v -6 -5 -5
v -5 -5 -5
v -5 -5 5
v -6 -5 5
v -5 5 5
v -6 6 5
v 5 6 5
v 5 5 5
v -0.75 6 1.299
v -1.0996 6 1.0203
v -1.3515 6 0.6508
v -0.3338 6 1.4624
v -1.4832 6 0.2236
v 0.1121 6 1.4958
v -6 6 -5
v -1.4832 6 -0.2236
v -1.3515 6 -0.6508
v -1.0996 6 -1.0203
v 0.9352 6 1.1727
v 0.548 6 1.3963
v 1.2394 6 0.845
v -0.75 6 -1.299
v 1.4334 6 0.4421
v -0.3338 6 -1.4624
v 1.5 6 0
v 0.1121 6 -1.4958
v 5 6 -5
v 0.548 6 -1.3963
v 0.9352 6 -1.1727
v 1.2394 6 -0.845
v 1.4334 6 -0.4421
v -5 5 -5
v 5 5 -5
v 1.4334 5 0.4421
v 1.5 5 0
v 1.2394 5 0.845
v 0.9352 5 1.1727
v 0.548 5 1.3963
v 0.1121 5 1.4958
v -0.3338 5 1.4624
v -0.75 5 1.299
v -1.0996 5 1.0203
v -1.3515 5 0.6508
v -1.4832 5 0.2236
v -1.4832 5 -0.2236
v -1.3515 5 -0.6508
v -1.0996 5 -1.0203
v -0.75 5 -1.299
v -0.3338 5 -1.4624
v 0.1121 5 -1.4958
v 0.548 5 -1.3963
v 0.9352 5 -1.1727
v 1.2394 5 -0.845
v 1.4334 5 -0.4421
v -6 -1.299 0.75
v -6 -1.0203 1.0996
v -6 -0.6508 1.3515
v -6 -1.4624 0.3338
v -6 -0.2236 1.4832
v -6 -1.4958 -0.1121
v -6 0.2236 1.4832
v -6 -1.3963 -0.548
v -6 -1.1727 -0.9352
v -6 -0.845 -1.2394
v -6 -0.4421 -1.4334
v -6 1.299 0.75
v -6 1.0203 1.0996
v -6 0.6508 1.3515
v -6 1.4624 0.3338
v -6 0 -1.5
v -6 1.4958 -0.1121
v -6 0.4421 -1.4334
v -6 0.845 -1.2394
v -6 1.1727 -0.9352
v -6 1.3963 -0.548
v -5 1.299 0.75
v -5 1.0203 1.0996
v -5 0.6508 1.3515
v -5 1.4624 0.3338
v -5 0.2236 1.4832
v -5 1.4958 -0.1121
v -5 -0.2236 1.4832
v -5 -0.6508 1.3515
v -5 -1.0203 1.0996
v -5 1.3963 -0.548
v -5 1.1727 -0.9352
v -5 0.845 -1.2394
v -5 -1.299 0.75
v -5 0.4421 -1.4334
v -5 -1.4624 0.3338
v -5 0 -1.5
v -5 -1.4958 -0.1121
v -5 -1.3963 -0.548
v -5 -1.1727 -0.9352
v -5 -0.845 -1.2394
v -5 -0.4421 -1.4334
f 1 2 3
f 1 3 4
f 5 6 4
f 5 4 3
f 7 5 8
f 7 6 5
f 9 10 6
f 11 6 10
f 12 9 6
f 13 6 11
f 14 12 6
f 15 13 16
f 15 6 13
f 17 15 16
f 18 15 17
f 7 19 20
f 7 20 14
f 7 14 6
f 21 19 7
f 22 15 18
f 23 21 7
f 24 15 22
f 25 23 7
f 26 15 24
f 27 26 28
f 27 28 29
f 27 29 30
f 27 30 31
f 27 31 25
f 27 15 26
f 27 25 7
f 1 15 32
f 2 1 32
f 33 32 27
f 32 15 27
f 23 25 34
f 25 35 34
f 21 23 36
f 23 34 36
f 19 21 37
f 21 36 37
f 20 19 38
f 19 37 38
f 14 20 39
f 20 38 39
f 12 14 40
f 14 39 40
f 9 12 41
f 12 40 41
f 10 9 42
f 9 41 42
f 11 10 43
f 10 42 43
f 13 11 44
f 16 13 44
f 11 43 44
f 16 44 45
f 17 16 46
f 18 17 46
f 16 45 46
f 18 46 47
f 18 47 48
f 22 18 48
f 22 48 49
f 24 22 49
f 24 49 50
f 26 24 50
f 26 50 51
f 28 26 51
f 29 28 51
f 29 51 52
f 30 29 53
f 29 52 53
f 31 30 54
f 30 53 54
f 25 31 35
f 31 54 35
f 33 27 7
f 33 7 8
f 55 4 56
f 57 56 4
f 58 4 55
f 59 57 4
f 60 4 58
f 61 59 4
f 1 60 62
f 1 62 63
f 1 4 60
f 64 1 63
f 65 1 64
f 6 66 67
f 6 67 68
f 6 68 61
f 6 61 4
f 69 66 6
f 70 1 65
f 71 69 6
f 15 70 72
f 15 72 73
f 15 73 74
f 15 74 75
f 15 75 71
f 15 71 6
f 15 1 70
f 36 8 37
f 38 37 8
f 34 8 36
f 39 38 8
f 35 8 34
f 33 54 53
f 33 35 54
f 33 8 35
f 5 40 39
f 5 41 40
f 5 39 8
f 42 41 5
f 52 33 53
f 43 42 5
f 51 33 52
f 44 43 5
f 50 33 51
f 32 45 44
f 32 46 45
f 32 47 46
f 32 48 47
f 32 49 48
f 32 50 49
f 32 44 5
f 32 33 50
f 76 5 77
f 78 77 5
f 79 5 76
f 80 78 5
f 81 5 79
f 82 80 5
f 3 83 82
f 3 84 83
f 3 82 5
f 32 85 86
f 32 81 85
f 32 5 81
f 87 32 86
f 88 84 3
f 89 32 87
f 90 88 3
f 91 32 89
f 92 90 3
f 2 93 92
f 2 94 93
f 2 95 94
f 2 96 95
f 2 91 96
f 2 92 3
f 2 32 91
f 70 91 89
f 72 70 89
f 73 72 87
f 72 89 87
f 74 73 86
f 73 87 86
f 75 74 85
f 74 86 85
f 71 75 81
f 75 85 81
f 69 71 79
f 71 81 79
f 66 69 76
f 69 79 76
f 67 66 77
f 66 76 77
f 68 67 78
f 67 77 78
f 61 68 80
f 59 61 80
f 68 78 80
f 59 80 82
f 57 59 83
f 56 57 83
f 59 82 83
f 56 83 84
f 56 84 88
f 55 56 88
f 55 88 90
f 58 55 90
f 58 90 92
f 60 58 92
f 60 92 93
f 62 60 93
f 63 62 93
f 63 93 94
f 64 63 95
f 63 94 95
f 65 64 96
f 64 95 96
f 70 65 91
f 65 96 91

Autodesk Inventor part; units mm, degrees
ref_plane "YZ Plane" through (0, 0, 0) normal (1, 0, 0) x (0, 1, 0)
ref_plane "XZ Plane" through (0, 0, 0) normal (0, 1, 0) x (-1, 0, 0)
ref_plane "XY Plane" through (0, 0, 0) normal (0, 0, 1) x (1, 0, 0)
sketch "Esquisse1" plane through (0, 0, 0) normal (0, 0, 1) x (1, 0, 0)
  line L0 (-6, 6) -> (-5, 6)
  line L1 (-5, 6) -> (-5, -5)
  line L2 (-5, -5) -> (-6, -5)
  line L3 (-6, -5) -> (-6, 6)
  line L4 (-5, 6) -> (5, 6)
  line L5 (5, 6) -> (5, 5)
  line L6 (5, 5) -> (-5, 5)
  line L7 (-5, 5) -> (-5, 6)
  point P0 (0, 0)
  dimension "d0" = 1
  dimension "d1" = 1
  dimension "d2" = 10
  dimension "d4" = 5
  dimension "d6" = 10
  dimension "d7" = 5
extrude "Extrusion1" add sketch "Esquisse1" along normal mid plane 10
sketch "Esquisse2" plane through (-5, 5, 5) normal (0, -1, 0) x (1, 0, 0)
  circle A0 centre (5, -5) radius 1.5
  dimension "d10" = 3
extrude "Extrusion2" cut sketch "Esquisse2" against normal through all
sketch "Esquisse3" plane through (-5, -5, 5) normal (1, 0, 0) x (0, 0, -1)
  circle A0 centre (5, 5) radius 1.5
  dimension "d13" = 3
extrude "Extrusion3" cut sketch "Esquisse3" against normal through all
equation "\"d4\" = 0.5 * d2"
equation "\"d7\" = 0.5 * d6"
properties part number "equerre"
